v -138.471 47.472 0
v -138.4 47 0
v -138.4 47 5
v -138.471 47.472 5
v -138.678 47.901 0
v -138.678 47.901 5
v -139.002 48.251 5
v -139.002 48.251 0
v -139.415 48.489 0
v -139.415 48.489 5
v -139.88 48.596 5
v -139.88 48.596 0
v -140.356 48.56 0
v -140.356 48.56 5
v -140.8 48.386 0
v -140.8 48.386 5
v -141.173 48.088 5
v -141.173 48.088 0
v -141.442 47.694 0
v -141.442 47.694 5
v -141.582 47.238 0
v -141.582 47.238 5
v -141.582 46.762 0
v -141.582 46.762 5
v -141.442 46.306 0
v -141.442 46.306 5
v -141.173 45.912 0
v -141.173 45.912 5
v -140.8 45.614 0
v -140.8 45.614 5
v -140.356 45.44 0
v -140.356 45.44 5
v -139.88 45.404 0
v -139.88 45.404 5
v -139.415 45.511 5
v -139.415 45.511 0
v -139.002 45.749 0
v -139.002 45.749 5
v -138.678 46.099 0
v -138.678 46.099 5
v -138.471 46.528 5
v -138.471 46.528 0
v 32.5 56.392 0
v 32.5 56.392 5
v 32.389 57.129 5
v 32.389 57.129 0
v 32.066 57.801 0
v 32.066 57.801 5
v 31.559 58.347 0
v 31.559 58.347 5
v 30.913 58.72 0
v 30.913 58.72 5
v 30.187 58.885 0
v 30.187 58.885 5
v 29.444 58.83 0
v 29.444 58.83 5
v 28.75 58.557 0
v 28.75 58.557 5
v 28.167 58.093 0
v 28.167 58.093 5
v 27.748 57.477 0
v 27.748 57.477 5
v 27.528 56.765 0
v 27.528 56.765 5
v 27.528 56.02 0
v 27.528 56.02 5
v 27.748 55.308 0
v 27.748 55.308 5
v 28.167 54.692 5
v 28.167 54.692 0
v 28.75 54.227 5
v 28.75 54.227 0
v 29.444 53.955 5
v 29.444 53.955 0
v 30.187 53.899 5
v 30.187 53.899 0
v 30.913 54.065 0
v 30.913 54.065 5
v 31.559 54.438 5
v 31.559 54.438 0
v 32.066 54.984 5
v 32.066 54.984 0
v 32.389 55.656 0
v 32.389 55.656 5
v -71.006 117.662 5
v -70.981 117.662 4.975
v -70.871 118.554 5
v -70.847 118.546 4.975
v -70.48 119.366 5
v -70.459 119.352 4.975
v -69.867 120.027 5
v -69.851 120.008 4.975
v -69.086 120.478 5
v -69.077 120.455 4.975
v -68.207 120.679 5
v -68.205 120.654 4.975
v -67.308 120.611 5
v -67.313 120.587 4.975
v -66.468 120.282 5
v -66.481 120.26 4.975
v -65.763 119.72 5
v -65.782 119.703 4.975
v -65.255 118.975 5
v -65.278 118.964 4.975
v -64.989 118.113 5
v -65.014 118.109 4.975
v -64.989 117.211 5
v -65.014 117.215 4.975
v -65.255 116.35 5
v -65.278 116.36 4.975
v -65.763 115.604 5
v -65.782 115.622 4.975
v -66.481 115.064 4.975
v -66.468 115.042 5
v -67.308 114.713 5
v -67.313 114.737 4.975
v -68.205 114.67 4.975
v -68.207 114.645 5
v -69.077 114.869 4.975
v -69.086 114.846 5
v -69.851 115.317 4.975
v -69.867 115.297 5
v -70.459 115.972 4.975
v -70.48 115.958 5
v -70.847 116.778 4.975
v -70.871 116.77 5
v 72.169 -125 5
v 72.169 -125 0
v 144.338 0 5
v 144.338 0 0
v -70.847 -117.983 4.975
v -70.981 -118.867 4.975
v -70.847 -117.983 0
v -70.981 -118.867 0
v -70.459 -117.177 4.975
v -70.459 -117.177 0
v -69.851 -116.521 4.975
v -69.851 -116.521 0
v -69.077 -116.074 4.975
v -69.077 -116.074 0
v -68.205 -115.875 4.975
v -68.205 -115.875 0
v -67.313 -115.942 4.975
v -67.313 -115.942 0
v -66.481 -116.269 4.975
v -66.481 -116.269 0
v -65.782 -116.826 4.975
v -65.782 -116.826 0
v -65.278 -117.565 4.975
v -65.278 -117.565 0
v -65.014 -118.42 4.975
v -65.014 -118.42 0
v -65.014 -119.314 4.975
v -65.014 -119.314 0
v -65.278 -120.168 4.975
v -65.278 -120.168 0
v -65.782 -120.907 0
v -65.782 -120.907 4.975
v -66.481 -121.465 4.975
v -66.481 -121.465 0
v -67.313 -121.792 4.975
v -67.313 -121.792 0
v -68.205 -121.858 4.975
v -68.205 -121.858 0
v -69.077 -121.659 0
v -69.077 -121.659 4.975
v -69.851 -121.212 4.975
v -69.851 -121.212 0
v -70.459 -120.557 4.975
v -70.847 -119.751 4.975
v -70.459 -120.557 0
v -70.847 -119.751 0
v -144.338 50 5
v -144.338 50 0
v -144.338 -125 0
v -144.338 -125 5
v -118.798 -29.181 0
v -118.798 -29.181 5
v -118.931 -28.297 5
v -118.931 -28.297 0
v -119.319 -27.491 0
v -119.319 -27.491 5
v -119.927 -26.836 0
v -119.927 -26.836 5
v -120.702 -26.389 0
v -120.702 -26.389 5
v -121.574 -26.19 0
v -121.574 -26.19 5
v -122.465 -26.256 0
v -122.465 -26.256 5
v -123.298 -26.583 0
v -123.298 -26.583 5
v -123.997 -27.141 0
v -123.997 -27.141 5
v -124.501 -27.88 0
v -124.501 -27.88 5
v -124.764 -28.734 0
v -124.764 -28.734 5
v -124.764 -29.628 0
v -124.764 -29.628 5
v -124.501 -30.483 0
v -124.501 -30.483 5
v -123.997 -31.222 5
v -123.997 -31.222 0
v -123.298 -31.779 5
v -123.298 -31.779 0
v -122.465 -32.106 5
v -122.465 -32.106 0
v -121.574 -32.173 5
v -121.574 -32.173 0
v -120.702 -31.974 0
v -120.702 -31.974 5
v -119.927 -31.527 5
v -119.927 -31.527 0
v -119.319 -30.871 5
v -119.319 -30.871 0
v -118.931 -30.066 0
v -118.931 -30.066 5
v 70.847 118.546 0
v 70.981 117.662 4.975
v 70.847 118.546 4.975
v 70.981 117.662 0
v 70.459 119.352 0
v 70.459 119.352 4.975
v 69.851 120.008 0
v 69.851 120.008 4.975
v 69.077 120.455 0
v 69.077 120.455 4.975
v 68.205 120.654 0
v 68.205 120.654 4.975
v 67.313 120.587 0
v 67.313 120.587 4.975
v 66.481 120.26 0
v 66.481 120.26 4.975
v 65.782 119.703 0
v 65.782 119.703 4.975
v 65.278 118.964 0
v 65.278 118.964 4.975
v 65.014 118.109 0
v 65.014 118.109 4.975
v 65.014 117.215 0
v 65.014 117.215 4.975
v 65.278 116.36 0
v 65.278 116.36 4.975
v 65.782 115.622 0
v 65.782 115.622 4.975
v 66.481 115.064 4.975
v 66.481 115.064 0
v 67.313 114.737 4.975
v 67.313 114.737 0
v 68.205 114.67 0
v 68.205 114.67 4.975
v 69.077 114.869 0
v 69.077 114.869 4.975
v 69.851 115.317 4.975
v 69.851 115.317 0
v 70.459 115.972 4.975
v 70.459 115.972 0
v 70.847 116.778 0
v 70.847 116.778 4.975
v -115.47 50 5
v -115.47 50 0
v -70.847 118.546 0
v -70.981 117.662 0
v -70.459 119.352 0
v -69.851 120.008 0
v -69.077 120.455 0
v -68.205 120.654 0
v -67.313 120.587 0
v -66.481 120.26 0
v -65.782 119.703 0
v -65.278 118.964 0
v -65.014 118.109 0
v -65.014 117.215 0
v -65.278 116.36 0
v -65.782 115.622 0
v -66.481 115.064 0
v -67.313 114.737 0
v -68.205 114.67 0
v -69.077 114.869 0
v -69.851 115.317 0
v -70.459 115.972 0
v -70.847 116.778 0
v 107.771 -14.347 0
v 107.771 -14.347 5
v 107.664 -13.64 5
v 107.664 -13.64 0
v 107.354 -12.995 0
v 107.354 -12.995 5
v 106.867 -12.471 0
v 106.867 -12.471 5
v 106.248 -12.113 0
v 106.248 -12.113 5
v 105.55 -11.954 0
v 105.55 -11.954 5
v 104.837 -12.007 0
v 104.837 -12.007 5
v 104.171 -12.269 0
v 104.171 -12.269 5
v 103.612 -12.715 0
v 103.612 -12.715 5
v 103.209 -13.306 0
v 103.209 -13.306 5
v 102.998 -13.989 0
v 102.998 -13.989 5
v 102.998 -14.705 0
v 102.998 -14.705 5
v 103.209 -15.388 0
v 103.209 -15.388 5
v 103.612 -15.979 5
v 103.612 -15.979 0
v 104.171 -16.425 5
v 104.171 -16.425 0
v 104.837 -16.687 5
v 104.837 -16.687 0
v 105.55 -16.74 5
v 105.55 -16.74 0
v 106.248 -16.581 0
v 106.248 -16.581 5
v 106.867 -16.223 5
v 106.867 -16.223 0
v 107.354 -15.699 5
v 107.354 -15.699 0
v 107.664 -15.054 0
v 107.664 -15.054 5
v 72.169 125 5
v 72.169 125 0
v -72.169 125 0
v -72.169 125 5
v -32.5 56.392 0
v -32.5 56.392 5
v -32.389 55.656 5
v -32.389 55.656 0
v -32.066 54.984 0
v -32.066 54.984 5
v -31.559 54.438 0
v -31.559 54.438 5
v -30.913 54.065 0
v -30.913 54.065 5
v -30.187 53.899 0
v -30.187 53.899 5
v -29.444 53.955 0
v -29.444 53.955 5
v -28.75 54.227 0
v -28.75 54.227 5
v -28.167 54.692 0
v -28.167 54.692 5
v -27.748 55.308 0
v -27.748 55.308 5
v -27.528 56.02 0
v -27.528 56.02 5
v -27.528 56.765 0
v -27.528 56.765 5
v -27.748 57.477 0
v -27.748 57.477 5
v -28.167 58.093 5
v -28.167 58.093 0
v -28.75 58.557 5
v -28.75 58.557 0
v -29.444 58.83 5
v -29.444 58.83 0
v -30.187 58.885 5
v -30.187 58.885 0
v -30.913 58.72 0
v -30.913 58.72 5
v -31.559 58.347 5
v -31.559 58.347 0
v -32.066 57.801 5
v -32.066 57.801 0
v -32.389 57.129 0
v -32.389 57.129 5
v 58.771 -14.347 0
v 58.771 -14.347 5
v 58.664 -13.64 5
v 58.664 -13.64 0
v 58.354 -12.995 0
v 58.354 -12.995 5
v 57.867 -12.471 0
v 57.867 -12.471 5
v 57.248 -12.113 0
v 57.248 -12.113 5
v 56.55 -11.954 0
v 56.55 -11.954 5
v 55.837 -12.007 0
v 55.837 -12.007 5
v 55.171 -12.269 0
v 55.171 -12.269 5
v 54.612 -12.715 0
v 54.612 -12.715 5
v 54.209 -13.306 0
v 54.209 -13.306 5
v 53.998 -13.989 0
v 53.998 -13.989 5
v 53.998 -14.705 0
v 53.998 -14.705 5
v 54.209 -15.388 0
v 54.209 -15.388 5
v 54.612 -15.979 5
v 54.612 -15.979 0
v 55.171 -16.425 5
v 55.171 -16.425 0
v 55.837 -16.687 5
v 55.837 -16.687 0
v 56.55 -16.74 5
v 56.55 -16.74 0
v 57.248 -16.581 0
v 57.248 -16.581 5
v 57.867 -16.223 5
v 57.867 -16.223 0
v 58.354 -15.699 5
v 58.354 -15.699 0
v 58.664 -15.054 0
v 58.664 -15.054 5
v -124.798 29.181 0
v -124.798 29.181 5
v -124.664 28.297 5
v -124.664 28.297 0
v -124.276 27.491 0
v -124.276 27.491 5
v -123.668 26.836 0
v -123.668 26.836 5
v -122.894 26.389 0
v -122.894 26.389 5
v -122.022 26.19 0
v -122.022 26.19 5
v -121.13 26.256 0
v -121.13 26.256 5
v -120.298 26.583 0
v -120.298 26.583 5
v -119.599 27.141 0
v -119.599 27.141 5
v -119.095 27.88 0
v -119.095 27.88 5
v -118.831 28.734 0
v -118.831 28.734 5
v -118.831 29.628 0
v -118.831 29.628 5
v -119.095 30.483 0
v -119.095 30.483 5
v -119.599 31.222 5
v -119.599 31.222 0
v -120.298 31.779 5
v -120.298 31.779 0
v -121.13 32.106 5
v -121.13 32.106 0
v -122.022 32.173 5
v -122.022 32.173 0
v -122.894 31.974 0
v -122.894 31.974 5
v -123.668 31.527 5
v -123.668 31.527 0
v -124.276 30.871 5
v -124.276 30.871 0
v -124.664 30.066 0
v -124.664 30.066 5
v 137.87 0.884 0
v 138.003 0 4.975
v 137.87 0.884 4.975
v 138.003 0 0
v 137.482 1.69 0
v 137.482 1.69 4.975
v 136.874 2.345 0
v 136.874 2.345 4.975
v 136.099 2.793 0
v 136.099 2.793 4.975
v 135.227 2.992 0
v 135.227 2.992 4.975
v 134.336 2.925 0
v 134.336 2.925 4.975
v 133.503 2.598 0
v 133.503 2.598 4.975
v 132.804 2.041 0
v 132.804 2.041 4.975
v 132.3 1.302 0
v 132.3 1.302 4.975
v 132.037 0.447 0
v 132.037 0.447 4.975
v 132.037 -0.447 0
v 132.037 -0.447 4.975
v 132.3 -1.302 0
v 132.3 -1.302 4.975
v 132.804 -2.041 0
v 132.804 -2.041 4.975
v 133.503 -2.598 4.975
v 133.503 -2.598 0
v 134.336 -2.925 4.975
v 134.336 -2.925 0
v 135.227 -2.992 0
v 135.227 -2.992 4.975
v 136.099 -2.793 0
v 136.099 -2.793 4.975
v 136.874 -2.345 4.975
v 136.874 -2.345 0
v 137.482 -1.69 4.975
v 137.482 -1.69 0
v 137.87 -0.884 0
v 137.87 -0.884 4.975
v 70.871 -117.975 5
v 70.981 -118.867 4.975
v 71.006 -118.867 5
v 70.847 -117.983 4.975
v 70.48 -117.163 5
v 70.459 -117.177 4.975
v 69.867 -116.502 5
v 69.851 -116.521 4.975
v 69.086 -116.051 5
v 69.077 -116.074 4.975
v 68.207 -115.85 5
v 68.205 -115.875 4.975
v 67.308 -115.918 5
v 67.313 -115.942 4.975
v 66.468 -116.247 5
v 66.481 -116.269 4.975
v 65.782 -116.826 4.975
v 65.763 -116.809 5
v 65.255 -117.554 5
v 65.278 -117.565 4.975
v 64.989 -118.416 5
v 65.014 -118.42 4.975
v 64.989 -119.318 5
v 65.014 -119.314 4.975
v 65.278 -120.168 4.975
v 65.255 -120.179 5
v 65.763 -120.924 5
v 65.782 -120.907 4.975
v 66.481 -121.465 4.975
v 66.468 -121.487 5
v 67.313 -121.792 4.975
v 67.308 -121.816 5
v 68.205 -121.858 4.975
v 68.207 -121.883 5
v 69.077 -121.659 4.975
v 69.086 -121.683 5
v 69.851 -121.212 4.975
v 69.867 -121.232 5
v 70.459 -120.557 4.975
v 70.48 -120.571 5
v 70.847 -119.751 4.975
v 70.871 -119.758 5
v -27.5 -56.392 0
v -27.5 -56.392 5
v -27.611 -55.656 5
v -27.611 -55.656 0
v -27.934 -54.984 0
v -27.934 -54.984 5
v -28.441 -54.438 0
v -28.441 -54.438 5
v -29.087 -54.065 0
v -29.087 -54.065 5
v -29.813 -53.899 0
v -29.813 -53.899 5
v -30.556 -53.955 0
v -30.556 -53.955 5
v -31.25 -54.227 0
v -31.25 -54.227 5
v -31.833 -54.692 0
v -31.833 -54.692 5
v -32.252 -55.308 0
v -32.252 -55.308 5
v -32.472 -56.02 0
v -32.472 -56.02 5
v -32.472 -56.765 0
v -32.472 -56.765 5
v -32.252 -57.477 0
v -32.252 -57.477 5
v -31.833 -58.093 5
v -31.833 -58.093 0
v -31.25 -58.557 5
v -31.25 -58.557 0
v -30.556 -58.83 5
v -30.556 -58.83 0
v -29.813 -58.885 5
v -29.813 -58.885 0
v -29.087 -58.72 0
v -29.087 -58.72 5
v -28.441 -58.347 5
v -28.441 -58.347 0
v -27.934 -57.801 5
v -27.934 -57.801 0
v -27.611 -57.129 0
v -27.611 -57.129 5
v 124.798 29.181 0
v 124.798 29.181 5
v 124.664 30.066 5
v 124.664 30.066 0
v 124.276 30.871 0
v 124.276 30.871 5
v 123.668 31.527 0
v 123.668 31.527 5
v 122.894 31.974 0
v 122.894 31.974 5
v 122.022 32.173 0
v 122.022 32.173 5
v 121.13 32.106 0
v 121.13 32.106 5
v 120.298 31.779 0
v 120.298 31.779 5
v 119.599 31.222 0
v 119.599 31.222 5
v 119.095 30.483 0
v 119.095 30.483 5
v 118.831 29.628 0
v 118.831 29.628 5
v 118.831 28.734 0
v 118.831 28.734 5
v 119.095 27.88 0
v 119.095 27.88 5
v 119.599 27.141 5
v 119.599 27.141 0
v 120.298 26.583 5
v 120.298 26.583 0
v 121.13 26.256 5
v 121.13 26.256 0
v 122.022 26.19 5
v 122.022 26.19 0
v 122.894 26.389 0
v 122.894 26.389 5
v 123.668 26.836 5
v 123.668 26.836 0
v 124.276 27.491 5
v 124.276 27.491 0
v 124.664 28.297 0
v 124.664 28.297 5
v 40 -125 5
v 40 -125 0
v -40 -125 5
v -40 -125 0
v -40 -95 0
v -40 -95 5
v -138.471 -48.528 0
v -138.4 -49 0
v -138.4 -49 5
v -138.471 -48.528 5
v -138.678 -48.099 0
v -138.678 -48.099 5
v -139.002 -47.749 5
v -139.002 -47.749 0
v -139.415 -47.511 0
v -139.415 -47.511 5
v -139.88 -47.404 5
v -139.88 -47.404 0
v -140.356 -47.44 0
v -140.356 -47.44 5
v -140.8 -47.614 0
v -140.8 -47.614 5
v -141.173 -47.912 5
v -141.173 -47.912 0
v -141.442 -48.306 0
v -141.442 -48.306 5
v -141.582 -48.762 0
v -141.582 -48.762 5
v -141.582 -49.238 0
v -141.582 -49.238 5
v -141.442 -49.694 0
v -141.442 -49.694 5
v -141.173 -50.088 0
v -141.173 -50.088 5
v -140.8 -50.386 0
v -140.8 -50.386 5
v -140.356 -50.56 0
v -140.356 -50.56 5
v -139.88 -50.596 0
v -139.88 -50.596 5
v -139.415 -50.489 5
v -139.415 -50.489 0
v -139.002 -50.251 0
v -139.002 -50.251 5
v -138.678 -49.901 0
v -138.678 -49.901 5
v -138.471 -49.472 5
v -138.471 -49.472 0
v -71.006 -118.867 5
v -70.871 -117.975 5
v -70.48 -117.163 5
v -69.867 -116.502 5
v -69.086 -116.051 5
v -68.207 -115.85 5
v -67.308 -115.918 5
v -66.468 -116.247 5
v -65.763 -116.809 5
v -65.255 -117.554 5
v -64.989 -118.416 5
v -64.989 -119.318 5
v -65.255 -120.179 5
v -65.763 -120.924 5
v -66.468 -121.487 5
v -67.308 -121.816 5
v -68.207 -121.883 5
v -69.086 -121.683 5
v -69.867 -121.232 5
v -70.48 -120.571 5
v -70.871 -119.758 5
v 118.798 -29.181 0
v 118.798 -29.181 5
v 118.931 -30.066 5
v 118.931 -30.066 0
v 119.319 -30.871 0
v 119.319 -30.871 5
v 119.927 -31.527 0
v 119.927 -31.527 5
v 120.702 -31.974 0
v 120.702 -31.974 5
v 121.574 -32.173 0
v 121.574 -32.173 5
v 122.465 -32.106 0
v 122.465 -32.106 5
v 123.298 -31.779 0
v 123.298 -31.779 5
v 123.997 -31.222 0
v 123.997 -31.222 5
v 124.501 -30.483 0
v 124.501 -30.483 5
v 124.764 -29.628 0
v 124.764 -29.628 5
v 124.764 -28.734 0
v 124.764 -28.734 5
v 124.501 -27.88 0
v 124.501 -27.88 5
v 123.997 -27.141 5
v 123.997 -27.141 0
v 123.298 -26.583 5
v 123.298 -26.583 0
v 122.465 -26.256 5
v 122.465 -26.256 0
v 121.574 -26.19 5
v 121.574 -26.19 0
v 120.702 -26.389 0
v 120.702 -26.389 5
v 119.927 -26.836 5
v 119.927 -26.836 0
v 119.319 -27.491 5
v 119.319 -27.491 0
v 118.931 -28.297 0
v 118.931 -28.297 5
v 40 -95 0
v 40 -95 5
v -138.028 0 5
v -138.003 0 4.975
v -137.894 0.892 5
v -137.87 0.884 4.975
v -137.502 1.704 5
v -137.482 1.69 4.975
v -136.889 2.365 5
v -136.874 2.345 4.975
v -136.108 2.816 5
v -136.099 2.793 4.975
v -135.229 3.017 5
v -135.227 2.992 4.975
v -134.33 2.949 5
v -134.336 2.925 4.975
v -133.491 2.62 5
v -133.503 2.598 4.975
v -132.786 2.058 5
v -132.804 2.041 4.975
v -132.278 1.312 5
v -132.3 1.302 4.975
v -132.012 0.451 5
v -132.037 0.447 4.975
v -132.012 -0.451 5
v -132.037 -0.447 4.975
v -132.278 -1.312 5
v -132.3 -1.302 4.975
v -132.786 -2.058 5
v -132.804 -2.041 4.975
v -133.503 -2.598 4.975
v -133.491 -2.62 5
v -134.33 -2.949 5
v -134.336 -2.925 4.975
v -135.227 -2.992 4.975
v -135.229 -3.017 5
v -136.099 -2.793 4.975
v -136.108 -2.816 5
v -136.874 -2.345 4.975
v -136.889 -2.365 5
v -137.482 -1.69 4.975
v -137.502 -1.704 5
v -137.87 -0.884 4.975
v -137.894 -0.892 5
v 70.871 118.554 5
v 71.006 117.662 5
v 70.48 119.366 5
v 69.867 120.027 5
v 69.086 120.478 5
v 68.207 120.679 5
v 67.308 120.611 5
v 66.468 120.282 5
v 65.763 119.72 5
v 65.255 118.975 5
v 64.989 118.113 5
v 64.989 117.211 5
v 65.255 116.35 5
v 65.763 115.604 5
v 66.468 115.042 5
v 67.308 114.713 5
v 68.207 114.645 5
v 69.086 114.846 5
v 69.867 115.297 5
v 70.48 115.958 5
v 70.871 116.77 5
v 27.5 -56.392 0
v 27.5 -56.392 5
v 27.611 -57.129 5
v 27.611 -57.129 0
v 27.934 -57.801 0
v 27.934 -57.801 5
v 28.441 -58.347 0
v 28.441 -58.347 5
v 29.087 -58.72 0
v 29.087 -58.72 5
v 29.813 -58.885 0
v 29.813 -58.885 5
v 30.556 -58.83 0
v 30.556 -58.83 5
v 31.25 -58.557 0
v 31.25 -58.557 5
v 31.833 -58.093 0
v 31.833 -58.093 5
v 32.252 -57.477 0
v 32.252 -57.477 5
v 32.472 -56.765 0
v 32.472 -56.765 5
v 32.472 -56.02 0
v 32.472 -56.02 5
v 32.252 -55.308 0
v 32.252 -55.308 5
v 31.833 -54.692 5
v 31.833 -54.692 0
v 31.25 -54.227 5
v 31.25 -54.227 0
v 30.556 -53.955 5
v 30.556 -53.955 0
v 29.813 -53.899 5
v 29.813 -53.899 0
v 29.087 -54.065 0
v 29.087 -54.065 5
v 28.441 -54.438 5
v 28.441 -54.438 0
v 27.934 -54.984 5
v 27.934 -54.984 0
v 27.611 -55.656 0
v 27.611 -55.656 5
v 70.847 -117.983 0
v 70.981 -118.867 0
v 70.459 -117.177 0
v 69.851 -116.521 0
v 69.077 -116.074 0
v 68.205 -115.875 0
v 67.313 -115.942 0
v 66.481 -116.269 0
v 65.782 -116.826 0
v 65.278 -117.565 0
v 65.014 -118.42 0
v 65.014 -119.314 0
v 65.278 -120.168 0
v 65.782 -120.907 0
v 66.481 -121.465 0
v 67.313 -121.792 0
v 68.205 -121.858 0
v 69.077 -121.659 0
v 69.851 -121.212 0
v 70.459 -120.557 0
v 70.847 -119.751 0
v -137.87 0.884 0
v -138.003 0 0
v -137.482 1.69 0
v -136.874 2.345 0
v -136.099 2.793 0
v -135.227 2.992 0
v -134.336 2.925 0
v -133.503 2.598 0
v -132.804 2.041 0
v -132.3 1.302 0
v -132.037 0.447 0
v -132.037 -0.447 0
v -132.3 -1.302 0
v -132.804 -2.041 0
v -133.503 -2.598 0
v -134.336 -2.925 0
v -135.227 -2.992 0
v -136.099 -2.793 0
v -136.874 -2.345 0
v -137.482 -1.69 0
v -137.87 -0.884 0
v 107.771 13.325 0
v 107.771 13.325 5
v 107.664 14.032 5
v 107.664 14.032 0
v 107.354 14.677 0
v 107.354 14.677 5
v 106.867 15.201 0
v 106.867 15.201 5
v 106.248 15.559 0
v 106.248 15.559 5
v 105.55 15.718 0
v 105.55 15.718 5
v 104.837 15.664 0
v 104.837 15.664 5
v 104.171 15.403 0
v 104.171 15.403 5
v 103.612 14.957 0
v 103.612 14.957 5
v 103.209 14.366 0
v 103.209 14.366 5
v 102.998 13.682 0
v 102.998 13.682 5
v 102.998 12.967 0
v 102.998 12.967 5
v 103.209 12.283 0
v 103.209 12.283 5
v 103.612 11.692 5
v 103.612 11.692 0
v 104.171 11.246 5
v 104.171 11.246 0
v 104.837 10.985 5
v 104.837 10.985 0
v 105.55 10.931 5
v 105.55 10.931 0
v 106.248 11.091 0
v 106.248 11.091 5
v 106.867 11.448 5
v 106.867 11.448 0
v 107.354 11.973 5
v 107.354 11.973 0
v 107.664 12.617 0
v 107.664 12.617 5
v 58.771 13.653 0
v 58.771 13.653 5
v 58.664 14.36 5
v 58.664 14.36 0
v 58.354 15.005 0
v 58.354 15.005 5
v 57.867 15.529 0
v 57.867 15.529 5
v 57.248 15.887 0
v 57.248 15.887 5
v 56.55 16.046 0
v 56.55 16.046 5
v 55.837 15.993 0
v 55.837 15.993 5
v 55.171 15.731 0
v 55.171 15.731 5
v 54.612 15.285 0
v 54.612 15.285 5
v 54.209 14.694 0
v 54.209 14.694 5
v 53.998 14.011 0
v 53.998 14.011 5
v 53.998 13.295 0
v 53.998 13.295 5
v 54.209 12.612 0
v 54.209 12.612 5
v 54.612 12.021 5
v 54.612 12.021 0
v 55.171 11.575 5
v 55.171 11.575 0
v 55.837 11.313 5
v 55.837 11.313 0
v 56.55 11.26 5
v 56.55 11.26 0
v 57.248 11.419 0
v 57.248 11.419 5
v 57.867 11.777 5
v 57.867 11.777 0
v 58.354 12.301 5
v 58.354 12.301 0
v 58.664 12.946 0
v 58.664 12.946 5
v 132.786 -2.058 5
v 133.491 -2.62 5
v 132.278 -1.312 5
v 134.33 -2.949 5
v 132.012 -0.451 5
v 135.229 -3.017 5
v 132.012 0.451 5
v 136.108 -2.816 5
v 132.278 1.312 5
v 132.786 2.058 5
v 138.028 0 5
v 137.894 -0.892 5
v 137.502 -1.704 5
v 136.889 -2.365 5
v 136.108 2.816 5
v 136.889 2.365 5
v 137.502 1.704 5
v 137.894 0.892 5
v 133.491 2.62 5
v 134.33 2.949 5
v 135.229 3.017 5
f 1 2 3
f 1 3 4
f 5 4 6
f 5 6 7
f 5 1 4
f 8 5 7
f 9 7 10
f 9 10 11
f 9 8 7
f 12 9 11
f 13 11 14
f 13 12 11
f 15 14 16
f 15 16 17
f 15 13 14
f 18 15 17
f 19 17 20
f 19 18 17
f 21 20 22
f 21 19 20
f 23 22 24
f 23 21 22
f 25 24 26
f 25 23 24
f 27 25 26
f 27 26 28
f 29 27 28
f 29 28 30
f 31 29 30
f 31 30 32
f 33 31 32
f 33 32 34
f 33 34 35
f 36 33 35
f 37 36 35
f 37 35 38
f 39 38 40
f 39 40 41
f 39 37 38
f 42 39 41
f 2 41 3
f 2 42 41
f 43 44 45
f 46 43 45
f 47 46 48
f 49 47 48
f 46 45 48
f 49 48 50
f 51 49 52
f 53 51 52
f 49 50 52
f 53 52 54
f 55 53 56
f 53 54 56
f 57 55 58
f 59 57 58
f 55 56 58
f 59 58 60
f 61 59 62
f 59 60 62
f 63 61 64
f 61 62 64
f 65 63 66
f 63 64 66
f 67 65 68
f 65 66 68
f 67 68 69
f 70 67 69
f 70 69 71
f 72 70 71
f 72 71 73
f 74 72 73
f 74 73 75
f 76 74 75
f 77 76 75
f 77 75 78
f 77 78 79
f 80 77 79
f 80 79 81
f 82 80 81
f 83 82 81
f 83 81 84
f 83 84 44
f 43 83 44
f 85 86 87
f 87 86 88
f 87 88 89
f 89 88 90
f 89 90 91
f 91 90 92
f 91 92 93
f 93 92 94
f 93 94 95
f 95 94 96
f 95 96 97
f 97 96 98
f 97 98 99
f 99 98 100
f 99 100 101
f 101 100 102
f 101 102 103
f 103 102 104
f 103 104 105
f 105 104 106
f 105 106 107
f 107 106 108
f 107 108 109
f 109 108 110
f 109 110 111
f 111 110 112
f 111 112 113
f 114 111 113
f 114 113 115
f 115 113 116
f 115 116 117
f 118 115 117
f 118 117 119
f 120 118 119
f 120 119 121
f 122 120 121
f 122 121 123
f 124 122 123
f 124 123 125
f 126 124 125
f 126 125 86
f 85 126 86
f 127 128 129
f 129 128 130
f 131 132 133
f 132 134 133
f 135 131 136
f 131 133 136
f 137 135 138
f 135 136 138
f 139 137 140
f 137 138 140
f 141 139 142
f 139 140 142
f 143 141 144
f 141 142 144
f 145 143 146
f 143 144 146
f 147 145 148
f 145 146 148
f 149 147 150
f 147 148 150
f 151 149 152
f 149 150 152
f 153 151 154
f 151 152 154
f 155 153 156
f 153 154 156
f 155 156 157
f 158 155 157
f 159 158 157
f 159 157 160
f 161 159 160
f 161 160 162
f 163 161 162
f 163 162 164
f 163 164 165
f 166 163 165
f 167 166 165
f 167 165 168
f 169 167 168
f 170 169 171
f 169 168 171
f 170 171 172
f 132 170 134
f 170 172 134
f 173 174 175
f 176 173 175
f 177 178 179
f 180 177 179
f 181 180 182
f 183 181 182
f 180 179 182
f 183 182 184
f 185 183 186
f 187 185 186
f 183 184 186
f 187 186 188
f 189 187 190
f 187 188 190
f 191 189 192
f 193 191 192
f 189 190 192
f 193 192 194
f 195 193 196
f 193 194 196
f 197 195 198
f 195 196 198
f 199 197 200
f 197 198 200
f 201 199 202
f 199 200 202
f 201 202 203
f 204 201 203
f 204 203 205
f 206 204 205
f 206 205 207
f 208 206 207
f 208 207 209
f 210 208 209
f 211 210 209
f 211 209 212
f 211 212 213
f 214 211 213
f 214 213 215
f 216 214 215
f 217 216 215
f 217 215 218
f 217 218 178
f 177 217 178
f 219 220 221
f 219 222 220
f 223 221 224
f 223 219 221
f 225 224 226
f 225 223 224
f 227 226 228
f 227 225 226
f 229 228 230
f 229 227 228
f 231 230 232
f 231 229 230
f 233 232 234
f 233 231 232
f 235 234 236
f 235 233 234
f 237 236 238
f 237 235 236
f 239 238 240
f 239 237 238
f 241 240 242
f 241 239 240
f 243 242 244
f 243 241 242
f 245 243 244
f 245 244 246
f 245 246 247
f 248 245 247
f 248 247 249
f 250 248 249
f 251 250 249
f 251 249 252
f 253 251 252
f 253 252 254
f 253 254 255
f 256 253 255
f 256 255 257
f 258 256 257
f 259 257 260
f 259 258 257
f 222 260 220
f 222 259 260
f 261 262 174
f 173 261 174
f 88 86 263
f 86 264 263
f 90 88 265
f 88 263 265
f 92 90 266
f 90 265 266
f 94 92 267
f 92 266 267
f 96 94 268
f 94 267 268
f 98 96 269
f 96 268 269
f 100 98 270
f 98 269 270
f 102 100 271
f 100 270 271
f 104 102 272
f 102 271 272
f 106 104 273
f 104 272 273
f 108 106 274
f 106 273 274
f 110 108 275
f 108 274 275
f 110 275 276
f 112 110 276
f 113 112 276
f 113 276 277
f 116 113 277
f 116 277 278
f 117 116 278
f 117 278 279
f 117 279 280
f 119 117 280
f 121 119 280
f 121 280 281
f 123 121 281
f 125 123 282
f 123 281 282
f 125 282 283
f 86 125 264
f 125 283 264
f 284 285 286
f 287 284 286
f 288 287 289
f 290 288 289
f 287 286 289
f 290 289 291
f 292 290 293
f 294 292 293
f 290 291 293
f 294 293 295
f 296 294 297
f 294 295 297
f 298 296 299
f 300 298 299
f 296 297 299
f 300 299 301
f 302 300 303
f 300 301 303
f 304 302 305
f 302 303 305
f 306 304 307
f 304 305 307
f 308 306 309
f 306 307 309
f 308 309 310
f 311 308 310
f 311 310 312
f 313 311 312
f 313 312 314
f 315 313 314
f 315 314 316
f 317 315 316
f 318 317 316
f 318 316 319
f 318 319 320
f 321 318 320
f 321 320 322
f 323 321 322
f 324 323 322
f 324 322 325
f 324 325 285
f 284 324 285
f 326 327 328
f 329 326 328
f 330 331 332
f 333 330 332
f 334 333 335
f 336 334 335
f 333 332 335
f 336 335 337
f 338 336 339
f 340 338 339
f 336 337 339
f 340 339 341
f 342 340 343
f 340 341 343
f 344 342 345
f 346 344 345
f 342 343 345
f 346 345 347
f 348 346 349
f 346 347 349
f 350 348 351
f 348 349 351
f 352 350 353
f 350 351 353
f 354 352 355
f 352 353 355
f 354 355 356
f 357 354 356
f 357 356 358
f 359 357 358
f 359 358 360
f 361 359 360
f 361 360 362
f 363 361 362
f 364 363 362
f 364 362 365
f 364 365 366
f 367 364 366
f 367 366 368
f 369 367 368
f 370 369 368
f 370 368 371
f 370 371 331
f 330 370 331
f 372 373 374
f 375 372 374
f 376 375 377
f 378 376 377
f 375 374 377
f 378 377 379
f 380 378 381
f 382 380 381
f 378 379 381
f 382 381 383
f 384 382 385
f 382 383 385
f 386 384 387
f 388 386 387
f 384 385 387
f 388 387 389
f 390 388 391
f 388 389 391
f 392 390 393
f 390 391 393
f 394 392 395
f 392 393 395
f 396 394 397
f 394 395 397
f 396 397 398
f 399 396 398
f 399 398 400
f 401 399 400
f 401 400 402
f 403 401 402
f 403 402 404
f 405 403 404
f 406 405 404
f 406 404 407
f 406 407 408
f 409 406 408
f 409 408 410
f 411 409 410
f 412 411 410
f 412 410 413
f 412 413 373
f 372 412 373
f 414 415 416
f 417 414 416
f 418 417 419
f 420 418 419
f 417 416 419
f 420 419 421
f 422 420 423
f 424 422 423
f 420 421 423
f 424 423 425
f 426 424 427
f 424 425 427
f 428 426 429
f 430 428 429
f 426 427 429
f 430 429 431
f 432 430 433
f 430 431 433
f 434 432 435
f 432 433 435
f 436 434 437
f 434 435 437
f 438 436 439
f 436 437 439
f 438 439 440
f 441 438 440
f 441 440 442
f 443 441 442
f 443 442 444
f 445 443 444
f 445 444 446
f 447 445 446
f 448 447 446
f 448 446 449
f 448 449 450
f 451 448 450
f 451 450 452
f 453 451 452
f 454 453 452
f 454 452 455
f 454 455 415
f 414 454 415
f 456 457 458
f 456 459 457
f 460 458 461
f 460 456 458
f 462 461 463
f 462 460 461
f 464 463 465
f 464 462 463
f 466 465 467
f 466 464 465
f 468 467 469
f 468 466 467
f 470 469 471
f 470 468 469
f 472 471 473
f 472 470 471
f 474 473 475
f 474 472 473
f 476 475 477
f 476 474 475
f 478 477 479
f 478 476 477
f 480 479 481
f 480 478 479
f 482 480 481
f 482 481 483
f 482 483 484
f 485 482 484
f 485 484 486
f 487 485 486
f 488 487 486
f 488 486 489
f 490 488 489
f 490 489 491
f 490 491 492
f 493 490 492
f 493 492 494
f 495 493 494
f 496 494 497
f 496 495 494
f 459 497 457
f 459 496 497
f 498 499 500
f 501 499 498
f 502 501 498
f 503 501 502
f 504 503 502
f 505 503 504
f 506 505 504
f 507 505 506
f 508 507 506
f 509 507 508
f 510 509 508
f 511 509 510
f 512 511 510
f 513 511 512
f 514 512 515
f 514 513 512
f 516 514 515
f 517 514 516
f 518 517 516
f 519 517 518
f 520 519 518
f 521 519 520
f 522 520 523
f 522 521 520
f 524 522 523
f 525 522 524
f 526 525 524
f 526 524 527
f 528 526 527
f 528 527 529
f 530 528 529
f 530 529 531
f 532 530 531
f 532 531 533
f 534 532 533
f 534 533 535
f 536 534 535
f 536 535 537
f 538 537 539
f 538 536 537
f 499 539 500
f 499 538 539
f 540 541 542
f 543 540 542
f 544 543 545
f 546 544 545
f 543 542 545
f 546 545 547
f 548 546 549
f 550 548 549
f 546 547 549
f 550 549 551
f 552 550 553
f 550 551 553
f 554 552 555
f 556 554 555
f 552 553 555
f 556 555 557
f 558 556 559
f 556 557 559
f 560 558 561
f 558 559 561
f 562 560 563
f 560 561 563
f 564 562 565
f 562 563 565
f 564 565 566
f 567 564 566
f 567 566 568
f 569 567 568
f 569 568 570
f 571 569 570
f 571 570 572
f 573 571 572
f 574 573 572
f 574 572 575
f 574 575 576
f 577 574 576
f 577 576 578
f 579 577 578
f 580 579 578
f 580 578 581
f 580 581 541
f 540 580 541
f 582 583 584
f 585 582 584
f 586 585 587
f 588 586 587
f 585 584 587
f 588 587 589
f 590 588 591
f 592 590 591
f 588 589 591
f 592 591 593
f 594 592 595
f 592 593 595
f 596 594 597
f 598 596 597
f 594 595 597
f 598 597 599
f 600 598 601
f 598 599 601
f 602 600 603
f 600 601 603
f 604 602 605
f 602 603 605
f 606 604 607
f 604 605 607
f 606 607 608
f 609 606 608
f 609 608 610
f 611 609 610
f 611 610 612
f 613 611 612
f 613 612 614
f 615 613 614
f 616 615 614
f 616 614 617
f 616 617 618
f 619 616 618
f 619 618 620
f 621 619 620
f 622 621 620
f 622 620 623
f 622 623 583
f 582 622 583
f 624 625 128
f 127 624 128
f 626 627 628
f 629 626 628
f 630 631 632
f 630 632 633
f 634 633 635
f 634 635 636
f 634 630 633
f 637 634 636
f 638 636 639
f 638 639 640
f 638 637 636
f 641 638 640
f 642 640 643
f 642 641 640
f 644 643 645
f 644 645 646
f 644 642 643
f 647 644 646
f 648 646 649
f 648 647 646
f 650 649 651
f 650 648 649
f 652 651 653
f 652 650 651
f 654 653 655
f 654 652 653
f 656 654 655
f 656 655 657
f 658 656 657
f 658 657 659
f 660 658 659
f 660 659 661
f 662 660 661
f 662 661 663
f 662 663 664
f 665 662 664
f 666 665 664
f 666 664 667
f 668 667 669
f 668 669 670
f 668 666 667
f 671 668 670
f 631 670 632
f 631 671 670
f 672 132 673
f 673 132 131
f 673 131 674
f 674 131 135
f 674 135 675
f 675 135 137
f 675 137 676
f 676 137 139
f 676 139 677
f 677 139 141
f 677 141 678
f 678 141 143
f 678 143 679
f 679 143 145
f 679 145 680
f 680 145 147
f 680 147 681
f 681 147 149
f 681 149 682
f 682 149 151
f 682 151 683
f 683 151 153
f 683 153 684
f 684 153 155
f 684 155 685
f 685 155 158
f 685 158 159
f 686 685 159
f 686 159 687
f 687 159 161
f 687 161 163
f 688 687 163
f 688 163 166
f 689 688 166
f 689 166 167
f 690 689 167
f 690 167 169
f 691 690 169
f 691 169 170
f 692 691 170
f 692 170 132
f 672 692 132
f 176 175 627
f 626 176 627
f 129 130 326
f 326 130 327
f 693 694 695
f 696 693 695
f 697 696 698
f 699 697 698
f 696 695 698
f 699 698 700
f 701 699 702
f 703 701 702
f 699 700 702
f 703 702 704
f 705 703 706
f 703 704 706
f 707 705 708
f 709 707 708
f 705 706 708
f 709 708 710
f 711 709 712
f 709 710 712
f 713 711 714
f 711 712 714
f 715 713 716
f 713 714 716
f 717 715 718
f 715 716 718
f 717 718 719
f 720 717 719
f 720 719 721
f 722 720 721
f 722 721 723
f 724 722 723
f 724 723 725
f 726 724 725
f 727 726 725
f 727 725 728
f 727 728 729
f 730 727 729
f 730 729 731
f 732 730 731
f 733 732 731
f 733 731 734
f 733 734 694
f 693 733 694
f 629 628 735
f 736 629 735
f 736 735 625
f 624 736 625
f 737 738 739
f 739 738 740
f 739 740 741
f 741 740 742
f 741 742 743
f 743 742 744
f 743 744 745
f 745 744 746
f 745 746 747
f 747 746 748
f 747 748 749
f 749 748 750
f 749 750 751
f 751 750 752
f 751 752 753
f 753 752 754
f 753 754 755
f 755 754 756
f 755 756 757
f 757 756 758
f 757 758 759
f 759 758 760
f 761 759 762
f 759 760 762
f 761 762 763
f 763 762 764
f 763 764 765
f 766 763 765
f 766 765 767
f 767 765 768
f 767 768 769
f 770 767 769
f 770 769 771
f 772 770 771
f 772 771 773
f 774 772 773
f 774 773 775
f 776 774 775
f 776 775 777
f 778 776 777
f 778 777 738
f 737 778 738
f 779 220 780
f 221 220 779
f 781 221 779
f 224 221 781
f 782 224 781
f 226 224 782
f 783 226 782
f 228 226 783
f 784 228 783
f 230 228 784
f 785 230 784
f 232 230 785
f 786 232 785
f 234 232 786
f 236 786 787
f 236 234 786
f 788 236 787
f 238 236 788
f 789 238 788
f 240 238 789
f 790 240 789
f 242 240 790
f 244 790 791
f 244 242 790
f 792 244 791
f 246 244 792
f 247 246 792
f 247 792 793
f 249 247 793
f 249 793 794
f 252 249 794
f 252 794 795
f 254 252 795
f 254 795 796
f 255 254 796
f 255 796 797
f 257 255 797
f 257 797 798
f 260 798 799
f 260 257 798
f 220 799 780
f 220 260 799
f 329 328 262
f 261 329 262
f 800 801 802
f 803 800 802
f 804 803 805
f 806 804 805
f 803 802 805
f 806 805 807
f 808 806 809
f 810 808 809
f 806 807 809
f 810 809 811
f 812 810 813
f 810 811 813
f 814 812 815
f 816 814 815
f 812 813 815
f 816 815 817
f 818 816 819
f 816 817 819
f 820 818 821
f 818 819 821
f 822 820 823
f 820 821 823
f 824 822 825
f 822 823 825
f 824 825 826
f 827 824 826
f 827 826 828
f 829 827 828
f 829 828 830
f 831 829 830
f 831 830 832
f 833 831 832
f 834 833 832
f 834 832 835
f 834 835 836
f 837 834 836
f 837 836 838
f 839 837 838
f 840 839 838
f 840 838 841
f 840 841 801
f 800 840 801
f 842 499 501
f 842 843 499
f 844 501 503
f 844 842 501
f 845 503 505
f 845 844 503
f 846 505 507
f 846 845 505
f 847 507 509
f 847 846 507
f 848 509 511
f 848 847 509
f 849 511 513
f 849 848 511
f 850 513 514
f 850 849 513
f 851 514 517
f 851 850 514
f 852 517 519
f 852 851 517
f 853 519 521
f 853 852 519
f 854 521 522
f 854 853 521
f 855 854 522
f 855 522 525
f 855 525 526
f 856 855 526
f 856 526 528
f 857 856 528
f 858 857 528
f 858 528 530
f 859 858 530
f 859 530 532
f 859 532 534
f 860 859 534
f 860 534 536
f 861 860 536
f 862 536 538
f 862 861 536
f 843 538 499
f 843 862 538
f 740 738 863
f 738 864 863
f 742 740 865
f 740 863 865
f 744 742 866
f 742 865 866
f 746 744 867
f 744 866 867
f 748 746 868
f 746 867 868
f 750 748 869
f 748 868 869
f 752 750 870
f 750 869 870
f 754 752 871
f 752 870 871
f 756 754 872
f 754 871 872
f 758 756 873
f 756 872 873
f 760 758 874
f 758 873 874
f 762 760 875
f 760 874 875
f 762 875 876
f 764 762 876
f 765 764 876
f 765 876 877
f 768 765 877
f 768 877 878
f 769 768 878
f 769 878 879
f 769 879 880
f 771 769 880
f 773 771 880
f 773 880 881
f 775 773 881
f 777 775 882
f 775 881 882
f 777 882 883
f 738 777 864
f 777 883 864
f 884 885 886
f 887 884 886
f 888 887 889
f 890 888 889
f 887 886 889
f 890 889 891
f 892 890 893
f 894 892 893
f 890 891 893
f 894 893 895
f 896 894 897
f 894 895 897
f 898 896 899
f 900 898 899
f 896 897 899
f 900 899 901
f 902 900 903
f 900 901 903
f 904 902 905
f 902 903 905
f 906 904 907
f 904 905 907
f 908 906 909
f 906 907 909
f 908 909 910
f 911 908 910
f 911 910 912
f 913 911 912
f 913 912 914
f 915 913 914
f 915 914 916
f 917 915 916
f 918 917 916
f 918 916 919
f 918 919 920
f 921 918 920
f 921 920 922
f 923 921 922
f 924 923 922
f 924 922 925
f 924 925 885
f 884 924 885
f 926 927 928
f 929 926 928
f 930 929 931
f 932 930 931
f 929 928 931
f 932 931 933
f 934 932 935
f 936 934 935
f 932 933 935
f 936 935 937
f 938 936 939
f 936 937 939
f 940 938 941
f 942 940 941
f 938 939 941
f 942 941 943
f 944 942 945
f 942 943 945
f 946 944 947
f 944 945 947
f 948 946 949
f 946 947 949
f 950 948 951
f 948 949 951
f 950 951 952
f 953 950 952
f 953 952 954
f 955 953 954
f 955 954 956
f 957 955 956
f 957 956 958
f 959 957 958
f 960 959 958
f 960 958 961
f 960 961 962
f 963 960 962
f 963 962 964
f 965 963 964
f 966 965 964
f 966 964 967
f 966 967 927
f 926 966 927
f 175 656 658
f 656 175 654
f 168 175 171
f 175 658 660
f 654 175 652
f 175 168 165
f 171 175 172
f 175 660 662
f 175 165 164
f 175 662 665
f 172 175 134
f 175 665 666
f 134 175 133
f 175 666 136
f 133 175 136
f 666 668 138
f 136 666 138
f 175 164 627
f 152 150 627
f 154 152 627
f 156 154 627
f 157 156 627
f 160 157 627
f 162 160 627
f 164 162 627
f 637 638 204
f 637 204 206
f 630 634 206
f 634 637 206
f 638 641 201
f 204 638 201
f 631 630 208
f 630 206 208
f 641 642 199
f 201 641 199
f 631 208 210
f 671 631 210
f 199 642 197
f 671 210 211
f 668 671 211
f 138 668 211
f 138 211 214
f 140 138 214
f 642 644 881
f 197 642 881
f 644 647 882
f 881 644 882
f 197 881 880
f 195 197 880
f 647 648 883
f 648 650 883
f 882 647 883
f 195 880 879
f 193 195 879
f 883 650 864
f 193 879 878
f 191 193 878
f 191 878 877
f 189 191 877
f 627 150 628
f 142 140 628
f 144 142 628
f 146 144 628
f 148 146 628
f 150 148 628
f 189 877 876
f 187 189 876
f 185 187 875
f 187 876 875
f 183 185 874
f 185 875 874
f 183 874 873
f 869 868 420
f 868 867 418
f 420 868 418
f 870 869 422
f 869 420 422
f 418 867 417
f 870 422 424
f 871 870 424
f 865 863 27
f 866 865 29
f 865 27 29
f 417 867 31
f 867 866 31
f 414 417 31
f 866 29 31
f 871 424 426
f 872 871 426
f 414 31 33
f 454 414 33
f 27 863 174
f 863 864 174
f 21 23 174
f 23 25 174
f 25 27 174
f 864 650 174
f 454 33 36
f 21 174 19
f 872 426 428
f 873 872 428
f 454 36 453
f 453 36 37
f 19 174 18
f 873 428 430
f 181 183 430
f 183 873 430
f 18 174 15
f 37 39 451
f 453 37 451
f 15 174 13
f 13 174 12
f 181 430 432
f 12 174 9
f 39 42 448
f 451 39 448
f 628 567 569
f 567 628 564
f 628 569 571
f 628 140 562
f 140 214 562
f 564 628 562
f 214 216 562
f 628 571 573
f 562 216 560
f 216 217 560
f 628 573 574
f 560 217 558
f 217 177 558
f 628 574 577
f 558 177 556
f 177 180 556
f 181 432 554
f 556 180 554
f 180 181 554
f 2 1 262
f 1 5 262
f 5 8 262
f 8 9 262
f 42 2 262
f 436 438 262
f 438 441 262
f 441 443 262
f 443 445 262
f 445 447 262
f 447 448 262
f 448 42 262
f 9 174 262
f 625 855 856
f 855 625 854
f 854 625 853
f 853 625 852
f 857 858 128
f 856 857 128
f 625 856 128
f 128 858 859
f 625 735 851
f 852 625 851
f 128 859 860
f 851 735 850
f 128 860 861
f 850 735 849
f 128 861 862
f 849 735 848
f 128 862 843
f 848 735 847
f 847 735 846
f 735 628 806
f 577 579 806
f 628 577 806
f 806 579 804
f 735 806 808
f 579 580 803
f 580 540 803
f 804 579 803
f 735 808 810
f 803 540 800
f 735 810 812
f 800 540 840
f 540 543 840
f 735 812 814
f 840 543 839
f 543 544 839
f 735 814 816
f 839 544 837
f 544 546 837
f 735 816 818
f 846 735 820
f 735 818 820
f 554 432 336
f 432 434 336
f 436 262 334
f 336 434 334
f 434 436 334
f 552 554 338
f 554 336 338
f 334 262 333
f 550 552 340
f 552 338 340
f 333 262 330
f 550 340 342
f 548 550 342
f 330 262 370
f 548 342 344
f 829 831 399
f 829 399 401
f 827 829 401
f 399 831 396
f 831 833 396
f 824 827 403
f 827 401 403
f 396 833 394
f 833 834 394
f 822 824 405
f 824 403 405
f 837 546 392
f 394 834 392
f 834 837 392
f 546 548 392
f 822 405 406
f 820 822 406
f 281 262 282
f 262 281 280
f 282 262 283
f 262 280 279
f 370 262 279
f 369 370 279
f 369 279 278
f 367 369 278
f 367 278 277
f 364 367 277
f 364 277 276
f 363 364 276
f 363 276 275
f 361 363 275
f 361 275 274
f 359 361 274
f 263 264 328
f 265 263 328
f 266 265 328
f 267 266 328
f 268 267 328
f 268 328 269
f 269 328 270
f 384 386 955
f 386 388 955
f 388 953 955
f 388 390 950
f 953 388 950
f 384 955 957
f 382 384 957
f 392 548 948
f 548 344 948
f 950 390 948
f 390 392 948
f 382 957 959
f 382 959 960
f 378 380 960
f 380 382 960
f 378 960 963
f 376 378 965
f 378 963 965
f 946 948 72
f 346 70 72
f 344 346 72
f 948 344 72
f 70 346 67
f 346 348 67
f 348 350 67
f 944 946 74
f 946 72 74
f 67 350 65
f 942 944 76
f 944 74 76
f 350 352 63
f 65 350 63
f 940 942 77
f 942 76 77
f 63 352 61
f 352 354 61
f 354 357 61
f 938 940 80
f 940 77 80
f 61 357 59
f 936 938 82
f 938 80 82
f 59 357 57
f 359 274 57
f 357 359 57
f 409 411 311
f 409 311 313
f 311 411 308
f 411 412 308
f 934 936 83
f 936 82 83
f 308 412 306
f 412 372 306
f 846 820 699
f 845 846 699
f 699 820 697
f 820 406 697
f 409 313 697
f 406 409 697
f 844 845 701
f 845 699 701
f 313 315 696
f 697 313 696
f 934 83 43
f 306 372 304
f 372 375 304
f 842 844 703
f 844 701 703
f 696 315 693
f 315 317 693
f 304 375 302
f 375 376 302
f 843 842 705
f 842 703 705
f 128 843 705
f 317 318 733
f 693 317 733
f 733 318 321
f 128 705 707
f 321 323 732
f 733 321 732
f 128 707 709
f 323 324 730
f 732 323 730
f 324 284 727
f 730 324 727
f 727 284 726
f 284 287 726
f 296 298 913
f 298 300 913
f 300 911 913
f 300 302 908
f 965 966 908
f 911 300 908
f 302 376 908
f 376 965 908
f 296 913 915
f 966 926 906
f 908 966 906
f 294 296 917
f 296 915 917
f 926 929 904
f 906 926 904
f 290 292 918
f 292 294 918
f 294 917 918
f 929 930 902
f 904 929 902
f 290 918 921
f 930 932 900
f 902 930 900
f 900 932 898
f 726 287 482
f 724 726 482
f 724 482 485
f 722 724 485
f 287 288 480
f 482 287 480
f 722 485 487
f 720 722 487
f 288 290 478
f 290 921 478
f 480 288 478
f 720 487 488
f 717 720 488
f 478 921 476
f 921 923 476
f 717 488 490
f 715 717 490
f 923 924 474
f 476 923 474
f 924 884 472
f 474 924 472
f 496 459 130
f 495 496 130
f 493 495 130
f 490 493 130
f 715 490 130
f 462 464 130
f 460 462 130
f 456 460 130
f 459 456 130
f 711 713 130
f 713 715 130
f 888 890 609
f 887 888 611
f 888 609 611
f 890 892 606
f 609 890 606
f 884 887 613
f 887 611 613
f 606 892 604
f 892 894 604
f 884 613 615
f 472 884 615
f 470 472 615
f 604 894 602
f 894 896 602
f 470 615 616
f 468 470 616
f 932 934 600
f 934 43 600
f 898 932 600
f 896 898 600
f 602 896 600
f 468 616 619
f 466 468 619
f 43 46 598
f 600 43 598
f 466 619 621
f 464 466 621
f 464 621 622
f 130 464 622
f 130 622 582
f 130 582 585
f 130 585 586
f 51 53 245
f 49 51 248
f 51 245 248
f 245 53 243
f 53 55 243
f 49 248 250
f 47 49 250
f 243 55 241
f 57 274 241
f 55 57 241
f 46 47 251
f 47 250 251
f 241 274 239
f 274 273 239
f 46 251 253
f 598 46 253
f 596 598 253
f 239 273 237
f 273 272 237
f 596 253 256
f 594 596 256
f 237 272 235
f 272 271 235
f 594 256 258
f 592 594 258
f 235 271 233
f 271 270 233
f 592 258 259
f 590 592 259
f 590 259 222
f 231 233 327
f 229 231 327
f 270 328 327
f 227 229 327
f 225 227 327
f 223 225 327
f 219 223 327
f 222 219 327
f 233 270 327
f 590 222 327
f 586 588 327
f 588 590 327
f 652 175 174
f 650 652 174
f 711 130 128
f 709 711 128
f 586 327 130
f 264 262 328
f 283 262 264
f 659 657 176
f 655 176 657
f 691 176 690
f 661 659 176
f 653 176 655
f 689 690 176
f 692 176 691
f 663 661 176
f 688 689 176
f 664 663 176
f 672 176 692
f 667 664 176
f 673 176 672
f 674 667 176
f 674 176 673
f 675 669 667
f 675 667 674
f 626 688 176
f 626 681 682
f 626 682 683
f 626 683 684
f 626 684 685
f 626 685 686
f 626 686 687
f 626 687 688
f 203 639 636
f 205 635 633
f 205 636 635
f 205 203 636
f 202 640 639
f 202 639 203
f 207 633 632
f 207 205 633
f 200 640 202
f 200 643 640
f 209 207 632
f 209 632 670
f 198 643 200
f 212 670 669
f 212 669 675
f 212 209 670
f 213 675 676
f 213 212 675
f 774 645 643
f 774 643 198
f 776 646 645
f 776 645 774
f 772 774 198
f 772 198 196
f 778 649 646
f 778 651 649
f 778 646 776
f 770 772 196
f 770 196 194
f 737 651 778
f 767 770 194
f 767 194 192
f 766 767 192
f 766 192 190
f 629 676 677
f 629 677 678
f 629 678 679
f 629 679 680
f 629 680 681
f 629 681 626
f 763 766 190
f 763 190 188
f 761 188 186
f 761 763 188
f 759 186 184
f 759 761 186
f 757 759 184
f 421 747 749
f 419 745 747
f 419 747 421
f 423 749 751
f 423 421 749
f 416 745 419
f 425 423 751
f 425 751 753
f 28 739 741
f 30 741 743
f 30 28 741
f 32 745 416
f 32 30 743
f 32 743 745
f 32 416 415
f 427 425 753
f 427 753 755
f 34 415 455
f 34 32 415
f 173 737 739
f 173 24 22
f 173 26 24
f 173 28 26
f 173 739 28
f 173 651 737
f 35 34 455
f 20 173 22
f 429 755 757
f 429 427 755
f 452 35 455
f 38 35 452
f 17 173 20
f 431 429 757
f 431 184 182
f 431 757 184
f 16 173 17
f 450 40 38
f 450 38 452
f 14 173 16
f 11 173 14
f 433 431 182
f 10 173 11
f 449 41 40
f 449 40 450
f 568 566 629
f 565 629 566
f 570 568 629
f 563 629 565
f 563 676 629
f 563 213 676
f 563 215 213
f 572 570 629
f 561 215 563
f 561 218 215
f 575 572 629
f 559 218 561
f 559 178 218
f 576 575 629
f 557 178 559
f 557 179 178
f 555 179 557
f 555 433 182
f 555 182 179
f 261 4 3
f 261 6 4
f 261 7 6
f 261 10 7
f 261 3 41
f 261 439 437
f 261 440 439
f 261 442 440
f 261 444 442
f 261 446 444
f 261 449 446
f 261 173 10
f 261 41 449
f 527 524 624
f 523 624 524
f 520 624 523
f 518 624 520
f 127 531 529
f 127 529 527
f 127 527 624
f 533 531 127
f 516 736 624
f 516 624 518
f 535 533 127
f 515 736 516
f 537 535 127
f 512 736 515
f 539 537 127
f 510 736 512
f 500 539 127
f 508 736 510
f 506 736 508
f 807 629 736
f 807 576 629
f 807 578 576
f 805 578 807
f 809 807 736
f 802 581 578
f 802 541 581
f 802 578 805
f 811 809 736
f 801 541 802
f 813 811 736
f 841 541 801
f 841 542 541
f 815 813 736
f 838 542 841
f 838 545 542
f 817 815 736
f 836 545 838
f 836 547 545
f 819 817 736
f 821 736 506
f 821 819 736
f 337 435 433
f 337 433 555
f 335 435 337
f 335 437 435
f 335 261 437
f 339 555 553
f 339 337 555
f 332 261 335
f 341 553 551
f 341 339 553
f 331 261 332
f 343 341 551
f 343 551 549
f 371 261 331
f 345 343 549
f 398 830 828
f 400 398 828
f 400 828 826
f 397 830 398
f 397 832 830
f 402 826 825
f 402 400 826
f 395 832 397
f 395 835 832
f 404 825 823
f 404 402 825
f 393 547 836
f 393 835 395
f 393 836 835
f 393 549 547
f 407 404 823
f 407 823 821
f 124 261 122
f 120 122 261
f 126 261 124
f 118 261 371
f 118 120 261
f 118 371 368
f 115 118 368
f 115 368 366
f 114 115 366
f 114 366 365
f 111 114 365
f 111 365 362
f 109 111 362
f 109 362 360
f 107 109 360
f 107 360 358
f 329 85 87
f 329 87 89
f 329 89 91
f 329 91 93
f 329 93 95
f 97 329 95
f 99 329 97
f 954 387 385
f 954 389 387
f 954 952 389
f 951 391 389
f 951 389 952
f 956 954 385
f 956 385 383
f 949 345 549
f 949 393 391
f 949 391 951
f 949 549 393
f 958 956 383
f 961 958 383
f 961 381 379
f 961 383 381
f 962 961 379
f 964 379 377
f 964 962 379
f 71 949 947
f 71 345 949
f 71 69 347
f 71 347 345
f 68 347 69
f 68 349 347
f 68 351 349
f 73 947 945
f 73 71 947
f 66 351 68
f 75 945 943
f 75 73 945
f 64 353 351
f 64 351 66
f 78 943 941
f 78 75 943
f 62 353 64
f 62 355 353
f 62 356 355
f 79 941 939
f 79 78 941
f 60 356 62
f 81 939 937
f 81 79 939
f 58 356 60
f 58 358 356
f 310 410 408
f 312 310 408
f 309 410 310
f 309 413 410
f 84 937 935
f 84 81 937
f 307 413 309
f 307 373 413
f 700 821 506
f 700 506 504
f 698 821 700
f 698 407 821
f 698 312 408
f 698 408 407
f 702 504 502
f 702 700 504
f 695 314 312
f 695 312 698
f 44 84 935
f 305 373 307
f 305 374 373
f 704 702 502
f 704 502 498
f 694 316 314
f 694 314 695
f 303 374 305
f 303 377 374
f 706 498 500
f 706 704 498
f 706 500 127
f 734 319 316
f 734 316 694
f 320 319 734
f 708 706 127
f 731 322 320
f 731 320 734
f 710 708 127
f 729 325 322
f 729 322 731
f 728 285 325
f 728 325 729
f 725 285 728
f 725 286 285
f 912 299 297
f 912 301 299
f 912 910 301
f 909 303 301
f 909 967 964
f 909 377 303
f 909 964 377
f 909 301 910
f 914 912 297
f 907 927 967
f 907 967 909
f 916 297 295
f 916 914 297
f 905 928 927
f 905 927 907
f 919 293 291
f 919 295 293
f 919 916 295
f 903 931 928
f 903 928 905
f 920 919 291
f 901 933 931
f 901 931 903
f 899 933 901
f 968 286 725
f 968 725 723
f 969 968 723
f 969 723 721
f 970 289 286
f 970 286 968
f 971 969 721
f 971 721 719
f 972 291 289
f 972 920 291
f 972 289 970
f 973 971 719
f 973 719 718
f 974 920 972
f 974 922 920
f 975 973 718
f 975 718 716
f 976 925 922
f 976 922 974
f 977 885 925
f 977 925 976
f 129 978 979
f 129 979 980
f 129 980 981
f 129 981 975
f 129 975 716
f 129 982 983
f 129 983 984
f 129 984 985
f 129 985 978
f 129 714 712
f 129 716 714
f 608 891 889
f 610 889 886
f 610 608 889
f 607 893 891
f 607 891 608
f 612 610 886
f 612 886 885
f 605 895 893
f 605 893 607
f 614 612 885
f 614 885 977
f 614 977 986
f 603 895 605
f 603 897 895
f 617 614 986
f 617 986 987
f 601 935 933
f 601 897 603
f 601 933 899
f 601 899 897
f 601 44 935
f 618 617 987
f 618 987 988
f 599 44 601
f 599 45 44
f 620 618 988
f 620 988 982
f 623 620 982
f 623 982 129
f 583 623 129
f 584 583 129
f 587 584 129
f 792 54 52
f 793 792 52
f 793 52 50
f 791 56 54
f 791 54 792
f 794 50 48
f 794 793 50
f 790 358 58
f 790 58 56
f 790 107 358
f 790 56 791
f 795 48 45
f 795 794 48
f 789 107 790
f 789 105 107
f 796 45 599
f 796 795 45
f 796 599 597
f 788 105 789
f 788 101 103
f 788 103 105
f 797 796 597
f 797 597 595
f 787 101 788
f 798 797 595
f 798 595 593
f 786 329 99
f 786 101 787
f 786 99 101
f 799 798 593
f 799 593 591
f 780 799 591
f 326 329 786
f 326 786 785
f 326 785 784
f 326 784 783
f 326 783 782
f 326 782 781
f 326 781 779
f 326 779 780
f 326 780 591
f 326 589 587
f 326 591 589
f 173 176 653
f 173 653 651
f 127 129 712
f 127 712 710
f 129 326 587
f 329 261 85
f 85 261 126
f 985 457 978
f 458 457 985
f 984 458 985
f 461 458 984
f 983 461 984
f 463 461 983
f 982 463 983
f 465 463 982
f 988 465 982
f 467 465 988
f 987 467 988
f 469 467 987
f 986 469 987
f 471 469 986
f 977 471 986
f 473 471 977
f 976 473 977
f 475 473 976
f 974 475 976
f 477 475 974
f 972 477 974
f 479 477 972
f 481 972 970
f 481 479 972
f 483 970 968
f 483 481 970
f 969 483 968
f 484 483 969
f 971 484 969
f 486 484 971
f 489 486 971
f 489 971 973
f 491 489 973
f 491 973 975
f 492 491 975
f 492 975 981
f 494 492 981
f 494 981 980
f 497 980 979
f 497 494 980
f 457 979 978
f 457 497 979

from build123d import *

# Parameters (mm, degrees)
EXTRUDE_3_DEPTH                 = 5
HOLE_WIZARD_6_0_6_1_D           = 6
HOLE_WIZARD_6_0_6_1_CSINK_D     = 6.05
HOLE_WIZARD_6_0_6_1_CSINK_ANGLE = 90
SKETCH_20_R                     = 2.4
CUT_EXTRUDE_2_DEPTH             = 192.006108105
SKETCH_33_R                     = 3
CUT_EXTRUDE_3_DEPTH             = 192.006108105
SKETCH_34_R                     = 2.5
CUT_EXTRUDE_4_DEPTH             = 192.006108105
SKETCH_35_R                     = 1.6
EXTRUDE_5_DEPTH                 = 5


with BuildPart() as part:
    # 草图8 → 凸台-拉伸3 (new body)
    with BuildSketch(Plane.XY):
        Polygon((144.337567297, 0), (72.168783649, 125), (-72.168783649, 125), (-144.337567297, 0), (-72.168783649, -125), (-40, -125), (-40, -95), (40, -95), (40, -125), (72.168783649, -125), align=None)
    extrude(amount=EXTRUDE_3_DEPTH)

    # Ø6.0 (6) 直径孔1 (through all)
    with Locations(Plane.XY.offset(5)):
        with Locations((-135.003092598, 0), (-67.980688817, -118.866778441), (-67.980688817, 117.662022204)):
            hole_wizard_6_0_6_1 = CounterSinkHole(HOLE_WIZARD_6_0_6_1_D / 2, HOLE_WIZARD_6_0_6_1_CSINK_D / 2, counter_sink_angle=HOLE_WIZARD_6_0_6_1_CSINK_ANGLE)

    # 镜向2: Ø6.0 (6) 直径孔1 across plane
    add(hole_wizard_6_0_6_1.mirror(Plane(origin=(0, 0, 0), x_dir=(0, 0, 1), z_dir=(1, 0, 0))), mode=Mode.SUBTRACT)

    # 草图20 → 切除-拉伸2 (cut, through all)
    with BuildSketch(Plane.XY.offset(5)):
        with Locations((56.370867728, 13.653021969)):
            Circle(SKETCH_20_R)
        with Locations((105.370867728, 13.324633606)):
            Circle(SKETCH_20_R)
        with Locations((56.370867728, -14.346978031)):
            Circle(SKETCH_20_R)
        with Locations((105.370867728, -14.346978031)):
            Circle(SKETCH_20_R)
    extrude(amount=-CUT_EXTRUDE_2_DEPTH, mode=Mode.SUBTRACT)

    # 草图33 → 切除-拉伸3 (cut, through all)
    with BuildSketch(Plane.XY.offset(5)):
        with Locations((-121.797773, -29.181235)):
            Circle(SKETCH_33_R)
        with Locations(Location((121.797773, -29.181235, 0), (0, 0, 180))):
            Circle(SKETCH_33_R)
        with Locations((121.797773, 29.181235)):
            Circle(SKETCH_33_R)
        with Locations(Location((-121.797773, 29.181235, 0), (0, 0, 180))):
            Circle(SKETCH_33_R)
    extrude(amount=-CUT_EXTRUDE_3_DEPTH, mode=Mode.SUBTRACT)

    # 草图34 → 切除-拉伸4 (cut, through all)
    with BuildSketch(Plane.XY.offset(5)):
        with Locations((-30, -56.392396)):
            Circle(SKETCH_34_R)
        with Locations(Location((30, -56.392396, 0), (0, 0, 180))):
            Circle(SKETCH_34_R)
        with Locations((30, 56.392396)):
            Circle(SKETCH_34_R)
        with Locations(Location((-30, 56.392396, 0), (0, 0, 180))):
            Circle(SKETCH_34_R)
    extrude(amount=-CUT_EXTRUDE_4_DEPTH, mode=Mode.SUBTRACT)

    # 草图35 → 凸台-拉伸5 (add)
    # profile 1 of 2: a face of its own
    with BuildSketch(Plane.XY):
        Polygon((-144.337567297, 0), (-115.470053838, 50), (-144.337567297, 50), align=None)
        with Locations((-140, 47)):
            Circle(SKETCH_35_R, mode=Mode.SUBTRACT)
    # profile 2 of 2: a face of its own
    with BuildSketch(Plane.XY):
        Polygon((-72.168783649, -125), (-144.337567297, 0), (-144.337567297, -125), align=None)
        with Locations((-140, -49)):
            Circle(SKETCH_35_R, mode=Mode.SUBTRACT)
    extrude(amount=EXTRUDE_5_DEPTH)


solid = part.part
